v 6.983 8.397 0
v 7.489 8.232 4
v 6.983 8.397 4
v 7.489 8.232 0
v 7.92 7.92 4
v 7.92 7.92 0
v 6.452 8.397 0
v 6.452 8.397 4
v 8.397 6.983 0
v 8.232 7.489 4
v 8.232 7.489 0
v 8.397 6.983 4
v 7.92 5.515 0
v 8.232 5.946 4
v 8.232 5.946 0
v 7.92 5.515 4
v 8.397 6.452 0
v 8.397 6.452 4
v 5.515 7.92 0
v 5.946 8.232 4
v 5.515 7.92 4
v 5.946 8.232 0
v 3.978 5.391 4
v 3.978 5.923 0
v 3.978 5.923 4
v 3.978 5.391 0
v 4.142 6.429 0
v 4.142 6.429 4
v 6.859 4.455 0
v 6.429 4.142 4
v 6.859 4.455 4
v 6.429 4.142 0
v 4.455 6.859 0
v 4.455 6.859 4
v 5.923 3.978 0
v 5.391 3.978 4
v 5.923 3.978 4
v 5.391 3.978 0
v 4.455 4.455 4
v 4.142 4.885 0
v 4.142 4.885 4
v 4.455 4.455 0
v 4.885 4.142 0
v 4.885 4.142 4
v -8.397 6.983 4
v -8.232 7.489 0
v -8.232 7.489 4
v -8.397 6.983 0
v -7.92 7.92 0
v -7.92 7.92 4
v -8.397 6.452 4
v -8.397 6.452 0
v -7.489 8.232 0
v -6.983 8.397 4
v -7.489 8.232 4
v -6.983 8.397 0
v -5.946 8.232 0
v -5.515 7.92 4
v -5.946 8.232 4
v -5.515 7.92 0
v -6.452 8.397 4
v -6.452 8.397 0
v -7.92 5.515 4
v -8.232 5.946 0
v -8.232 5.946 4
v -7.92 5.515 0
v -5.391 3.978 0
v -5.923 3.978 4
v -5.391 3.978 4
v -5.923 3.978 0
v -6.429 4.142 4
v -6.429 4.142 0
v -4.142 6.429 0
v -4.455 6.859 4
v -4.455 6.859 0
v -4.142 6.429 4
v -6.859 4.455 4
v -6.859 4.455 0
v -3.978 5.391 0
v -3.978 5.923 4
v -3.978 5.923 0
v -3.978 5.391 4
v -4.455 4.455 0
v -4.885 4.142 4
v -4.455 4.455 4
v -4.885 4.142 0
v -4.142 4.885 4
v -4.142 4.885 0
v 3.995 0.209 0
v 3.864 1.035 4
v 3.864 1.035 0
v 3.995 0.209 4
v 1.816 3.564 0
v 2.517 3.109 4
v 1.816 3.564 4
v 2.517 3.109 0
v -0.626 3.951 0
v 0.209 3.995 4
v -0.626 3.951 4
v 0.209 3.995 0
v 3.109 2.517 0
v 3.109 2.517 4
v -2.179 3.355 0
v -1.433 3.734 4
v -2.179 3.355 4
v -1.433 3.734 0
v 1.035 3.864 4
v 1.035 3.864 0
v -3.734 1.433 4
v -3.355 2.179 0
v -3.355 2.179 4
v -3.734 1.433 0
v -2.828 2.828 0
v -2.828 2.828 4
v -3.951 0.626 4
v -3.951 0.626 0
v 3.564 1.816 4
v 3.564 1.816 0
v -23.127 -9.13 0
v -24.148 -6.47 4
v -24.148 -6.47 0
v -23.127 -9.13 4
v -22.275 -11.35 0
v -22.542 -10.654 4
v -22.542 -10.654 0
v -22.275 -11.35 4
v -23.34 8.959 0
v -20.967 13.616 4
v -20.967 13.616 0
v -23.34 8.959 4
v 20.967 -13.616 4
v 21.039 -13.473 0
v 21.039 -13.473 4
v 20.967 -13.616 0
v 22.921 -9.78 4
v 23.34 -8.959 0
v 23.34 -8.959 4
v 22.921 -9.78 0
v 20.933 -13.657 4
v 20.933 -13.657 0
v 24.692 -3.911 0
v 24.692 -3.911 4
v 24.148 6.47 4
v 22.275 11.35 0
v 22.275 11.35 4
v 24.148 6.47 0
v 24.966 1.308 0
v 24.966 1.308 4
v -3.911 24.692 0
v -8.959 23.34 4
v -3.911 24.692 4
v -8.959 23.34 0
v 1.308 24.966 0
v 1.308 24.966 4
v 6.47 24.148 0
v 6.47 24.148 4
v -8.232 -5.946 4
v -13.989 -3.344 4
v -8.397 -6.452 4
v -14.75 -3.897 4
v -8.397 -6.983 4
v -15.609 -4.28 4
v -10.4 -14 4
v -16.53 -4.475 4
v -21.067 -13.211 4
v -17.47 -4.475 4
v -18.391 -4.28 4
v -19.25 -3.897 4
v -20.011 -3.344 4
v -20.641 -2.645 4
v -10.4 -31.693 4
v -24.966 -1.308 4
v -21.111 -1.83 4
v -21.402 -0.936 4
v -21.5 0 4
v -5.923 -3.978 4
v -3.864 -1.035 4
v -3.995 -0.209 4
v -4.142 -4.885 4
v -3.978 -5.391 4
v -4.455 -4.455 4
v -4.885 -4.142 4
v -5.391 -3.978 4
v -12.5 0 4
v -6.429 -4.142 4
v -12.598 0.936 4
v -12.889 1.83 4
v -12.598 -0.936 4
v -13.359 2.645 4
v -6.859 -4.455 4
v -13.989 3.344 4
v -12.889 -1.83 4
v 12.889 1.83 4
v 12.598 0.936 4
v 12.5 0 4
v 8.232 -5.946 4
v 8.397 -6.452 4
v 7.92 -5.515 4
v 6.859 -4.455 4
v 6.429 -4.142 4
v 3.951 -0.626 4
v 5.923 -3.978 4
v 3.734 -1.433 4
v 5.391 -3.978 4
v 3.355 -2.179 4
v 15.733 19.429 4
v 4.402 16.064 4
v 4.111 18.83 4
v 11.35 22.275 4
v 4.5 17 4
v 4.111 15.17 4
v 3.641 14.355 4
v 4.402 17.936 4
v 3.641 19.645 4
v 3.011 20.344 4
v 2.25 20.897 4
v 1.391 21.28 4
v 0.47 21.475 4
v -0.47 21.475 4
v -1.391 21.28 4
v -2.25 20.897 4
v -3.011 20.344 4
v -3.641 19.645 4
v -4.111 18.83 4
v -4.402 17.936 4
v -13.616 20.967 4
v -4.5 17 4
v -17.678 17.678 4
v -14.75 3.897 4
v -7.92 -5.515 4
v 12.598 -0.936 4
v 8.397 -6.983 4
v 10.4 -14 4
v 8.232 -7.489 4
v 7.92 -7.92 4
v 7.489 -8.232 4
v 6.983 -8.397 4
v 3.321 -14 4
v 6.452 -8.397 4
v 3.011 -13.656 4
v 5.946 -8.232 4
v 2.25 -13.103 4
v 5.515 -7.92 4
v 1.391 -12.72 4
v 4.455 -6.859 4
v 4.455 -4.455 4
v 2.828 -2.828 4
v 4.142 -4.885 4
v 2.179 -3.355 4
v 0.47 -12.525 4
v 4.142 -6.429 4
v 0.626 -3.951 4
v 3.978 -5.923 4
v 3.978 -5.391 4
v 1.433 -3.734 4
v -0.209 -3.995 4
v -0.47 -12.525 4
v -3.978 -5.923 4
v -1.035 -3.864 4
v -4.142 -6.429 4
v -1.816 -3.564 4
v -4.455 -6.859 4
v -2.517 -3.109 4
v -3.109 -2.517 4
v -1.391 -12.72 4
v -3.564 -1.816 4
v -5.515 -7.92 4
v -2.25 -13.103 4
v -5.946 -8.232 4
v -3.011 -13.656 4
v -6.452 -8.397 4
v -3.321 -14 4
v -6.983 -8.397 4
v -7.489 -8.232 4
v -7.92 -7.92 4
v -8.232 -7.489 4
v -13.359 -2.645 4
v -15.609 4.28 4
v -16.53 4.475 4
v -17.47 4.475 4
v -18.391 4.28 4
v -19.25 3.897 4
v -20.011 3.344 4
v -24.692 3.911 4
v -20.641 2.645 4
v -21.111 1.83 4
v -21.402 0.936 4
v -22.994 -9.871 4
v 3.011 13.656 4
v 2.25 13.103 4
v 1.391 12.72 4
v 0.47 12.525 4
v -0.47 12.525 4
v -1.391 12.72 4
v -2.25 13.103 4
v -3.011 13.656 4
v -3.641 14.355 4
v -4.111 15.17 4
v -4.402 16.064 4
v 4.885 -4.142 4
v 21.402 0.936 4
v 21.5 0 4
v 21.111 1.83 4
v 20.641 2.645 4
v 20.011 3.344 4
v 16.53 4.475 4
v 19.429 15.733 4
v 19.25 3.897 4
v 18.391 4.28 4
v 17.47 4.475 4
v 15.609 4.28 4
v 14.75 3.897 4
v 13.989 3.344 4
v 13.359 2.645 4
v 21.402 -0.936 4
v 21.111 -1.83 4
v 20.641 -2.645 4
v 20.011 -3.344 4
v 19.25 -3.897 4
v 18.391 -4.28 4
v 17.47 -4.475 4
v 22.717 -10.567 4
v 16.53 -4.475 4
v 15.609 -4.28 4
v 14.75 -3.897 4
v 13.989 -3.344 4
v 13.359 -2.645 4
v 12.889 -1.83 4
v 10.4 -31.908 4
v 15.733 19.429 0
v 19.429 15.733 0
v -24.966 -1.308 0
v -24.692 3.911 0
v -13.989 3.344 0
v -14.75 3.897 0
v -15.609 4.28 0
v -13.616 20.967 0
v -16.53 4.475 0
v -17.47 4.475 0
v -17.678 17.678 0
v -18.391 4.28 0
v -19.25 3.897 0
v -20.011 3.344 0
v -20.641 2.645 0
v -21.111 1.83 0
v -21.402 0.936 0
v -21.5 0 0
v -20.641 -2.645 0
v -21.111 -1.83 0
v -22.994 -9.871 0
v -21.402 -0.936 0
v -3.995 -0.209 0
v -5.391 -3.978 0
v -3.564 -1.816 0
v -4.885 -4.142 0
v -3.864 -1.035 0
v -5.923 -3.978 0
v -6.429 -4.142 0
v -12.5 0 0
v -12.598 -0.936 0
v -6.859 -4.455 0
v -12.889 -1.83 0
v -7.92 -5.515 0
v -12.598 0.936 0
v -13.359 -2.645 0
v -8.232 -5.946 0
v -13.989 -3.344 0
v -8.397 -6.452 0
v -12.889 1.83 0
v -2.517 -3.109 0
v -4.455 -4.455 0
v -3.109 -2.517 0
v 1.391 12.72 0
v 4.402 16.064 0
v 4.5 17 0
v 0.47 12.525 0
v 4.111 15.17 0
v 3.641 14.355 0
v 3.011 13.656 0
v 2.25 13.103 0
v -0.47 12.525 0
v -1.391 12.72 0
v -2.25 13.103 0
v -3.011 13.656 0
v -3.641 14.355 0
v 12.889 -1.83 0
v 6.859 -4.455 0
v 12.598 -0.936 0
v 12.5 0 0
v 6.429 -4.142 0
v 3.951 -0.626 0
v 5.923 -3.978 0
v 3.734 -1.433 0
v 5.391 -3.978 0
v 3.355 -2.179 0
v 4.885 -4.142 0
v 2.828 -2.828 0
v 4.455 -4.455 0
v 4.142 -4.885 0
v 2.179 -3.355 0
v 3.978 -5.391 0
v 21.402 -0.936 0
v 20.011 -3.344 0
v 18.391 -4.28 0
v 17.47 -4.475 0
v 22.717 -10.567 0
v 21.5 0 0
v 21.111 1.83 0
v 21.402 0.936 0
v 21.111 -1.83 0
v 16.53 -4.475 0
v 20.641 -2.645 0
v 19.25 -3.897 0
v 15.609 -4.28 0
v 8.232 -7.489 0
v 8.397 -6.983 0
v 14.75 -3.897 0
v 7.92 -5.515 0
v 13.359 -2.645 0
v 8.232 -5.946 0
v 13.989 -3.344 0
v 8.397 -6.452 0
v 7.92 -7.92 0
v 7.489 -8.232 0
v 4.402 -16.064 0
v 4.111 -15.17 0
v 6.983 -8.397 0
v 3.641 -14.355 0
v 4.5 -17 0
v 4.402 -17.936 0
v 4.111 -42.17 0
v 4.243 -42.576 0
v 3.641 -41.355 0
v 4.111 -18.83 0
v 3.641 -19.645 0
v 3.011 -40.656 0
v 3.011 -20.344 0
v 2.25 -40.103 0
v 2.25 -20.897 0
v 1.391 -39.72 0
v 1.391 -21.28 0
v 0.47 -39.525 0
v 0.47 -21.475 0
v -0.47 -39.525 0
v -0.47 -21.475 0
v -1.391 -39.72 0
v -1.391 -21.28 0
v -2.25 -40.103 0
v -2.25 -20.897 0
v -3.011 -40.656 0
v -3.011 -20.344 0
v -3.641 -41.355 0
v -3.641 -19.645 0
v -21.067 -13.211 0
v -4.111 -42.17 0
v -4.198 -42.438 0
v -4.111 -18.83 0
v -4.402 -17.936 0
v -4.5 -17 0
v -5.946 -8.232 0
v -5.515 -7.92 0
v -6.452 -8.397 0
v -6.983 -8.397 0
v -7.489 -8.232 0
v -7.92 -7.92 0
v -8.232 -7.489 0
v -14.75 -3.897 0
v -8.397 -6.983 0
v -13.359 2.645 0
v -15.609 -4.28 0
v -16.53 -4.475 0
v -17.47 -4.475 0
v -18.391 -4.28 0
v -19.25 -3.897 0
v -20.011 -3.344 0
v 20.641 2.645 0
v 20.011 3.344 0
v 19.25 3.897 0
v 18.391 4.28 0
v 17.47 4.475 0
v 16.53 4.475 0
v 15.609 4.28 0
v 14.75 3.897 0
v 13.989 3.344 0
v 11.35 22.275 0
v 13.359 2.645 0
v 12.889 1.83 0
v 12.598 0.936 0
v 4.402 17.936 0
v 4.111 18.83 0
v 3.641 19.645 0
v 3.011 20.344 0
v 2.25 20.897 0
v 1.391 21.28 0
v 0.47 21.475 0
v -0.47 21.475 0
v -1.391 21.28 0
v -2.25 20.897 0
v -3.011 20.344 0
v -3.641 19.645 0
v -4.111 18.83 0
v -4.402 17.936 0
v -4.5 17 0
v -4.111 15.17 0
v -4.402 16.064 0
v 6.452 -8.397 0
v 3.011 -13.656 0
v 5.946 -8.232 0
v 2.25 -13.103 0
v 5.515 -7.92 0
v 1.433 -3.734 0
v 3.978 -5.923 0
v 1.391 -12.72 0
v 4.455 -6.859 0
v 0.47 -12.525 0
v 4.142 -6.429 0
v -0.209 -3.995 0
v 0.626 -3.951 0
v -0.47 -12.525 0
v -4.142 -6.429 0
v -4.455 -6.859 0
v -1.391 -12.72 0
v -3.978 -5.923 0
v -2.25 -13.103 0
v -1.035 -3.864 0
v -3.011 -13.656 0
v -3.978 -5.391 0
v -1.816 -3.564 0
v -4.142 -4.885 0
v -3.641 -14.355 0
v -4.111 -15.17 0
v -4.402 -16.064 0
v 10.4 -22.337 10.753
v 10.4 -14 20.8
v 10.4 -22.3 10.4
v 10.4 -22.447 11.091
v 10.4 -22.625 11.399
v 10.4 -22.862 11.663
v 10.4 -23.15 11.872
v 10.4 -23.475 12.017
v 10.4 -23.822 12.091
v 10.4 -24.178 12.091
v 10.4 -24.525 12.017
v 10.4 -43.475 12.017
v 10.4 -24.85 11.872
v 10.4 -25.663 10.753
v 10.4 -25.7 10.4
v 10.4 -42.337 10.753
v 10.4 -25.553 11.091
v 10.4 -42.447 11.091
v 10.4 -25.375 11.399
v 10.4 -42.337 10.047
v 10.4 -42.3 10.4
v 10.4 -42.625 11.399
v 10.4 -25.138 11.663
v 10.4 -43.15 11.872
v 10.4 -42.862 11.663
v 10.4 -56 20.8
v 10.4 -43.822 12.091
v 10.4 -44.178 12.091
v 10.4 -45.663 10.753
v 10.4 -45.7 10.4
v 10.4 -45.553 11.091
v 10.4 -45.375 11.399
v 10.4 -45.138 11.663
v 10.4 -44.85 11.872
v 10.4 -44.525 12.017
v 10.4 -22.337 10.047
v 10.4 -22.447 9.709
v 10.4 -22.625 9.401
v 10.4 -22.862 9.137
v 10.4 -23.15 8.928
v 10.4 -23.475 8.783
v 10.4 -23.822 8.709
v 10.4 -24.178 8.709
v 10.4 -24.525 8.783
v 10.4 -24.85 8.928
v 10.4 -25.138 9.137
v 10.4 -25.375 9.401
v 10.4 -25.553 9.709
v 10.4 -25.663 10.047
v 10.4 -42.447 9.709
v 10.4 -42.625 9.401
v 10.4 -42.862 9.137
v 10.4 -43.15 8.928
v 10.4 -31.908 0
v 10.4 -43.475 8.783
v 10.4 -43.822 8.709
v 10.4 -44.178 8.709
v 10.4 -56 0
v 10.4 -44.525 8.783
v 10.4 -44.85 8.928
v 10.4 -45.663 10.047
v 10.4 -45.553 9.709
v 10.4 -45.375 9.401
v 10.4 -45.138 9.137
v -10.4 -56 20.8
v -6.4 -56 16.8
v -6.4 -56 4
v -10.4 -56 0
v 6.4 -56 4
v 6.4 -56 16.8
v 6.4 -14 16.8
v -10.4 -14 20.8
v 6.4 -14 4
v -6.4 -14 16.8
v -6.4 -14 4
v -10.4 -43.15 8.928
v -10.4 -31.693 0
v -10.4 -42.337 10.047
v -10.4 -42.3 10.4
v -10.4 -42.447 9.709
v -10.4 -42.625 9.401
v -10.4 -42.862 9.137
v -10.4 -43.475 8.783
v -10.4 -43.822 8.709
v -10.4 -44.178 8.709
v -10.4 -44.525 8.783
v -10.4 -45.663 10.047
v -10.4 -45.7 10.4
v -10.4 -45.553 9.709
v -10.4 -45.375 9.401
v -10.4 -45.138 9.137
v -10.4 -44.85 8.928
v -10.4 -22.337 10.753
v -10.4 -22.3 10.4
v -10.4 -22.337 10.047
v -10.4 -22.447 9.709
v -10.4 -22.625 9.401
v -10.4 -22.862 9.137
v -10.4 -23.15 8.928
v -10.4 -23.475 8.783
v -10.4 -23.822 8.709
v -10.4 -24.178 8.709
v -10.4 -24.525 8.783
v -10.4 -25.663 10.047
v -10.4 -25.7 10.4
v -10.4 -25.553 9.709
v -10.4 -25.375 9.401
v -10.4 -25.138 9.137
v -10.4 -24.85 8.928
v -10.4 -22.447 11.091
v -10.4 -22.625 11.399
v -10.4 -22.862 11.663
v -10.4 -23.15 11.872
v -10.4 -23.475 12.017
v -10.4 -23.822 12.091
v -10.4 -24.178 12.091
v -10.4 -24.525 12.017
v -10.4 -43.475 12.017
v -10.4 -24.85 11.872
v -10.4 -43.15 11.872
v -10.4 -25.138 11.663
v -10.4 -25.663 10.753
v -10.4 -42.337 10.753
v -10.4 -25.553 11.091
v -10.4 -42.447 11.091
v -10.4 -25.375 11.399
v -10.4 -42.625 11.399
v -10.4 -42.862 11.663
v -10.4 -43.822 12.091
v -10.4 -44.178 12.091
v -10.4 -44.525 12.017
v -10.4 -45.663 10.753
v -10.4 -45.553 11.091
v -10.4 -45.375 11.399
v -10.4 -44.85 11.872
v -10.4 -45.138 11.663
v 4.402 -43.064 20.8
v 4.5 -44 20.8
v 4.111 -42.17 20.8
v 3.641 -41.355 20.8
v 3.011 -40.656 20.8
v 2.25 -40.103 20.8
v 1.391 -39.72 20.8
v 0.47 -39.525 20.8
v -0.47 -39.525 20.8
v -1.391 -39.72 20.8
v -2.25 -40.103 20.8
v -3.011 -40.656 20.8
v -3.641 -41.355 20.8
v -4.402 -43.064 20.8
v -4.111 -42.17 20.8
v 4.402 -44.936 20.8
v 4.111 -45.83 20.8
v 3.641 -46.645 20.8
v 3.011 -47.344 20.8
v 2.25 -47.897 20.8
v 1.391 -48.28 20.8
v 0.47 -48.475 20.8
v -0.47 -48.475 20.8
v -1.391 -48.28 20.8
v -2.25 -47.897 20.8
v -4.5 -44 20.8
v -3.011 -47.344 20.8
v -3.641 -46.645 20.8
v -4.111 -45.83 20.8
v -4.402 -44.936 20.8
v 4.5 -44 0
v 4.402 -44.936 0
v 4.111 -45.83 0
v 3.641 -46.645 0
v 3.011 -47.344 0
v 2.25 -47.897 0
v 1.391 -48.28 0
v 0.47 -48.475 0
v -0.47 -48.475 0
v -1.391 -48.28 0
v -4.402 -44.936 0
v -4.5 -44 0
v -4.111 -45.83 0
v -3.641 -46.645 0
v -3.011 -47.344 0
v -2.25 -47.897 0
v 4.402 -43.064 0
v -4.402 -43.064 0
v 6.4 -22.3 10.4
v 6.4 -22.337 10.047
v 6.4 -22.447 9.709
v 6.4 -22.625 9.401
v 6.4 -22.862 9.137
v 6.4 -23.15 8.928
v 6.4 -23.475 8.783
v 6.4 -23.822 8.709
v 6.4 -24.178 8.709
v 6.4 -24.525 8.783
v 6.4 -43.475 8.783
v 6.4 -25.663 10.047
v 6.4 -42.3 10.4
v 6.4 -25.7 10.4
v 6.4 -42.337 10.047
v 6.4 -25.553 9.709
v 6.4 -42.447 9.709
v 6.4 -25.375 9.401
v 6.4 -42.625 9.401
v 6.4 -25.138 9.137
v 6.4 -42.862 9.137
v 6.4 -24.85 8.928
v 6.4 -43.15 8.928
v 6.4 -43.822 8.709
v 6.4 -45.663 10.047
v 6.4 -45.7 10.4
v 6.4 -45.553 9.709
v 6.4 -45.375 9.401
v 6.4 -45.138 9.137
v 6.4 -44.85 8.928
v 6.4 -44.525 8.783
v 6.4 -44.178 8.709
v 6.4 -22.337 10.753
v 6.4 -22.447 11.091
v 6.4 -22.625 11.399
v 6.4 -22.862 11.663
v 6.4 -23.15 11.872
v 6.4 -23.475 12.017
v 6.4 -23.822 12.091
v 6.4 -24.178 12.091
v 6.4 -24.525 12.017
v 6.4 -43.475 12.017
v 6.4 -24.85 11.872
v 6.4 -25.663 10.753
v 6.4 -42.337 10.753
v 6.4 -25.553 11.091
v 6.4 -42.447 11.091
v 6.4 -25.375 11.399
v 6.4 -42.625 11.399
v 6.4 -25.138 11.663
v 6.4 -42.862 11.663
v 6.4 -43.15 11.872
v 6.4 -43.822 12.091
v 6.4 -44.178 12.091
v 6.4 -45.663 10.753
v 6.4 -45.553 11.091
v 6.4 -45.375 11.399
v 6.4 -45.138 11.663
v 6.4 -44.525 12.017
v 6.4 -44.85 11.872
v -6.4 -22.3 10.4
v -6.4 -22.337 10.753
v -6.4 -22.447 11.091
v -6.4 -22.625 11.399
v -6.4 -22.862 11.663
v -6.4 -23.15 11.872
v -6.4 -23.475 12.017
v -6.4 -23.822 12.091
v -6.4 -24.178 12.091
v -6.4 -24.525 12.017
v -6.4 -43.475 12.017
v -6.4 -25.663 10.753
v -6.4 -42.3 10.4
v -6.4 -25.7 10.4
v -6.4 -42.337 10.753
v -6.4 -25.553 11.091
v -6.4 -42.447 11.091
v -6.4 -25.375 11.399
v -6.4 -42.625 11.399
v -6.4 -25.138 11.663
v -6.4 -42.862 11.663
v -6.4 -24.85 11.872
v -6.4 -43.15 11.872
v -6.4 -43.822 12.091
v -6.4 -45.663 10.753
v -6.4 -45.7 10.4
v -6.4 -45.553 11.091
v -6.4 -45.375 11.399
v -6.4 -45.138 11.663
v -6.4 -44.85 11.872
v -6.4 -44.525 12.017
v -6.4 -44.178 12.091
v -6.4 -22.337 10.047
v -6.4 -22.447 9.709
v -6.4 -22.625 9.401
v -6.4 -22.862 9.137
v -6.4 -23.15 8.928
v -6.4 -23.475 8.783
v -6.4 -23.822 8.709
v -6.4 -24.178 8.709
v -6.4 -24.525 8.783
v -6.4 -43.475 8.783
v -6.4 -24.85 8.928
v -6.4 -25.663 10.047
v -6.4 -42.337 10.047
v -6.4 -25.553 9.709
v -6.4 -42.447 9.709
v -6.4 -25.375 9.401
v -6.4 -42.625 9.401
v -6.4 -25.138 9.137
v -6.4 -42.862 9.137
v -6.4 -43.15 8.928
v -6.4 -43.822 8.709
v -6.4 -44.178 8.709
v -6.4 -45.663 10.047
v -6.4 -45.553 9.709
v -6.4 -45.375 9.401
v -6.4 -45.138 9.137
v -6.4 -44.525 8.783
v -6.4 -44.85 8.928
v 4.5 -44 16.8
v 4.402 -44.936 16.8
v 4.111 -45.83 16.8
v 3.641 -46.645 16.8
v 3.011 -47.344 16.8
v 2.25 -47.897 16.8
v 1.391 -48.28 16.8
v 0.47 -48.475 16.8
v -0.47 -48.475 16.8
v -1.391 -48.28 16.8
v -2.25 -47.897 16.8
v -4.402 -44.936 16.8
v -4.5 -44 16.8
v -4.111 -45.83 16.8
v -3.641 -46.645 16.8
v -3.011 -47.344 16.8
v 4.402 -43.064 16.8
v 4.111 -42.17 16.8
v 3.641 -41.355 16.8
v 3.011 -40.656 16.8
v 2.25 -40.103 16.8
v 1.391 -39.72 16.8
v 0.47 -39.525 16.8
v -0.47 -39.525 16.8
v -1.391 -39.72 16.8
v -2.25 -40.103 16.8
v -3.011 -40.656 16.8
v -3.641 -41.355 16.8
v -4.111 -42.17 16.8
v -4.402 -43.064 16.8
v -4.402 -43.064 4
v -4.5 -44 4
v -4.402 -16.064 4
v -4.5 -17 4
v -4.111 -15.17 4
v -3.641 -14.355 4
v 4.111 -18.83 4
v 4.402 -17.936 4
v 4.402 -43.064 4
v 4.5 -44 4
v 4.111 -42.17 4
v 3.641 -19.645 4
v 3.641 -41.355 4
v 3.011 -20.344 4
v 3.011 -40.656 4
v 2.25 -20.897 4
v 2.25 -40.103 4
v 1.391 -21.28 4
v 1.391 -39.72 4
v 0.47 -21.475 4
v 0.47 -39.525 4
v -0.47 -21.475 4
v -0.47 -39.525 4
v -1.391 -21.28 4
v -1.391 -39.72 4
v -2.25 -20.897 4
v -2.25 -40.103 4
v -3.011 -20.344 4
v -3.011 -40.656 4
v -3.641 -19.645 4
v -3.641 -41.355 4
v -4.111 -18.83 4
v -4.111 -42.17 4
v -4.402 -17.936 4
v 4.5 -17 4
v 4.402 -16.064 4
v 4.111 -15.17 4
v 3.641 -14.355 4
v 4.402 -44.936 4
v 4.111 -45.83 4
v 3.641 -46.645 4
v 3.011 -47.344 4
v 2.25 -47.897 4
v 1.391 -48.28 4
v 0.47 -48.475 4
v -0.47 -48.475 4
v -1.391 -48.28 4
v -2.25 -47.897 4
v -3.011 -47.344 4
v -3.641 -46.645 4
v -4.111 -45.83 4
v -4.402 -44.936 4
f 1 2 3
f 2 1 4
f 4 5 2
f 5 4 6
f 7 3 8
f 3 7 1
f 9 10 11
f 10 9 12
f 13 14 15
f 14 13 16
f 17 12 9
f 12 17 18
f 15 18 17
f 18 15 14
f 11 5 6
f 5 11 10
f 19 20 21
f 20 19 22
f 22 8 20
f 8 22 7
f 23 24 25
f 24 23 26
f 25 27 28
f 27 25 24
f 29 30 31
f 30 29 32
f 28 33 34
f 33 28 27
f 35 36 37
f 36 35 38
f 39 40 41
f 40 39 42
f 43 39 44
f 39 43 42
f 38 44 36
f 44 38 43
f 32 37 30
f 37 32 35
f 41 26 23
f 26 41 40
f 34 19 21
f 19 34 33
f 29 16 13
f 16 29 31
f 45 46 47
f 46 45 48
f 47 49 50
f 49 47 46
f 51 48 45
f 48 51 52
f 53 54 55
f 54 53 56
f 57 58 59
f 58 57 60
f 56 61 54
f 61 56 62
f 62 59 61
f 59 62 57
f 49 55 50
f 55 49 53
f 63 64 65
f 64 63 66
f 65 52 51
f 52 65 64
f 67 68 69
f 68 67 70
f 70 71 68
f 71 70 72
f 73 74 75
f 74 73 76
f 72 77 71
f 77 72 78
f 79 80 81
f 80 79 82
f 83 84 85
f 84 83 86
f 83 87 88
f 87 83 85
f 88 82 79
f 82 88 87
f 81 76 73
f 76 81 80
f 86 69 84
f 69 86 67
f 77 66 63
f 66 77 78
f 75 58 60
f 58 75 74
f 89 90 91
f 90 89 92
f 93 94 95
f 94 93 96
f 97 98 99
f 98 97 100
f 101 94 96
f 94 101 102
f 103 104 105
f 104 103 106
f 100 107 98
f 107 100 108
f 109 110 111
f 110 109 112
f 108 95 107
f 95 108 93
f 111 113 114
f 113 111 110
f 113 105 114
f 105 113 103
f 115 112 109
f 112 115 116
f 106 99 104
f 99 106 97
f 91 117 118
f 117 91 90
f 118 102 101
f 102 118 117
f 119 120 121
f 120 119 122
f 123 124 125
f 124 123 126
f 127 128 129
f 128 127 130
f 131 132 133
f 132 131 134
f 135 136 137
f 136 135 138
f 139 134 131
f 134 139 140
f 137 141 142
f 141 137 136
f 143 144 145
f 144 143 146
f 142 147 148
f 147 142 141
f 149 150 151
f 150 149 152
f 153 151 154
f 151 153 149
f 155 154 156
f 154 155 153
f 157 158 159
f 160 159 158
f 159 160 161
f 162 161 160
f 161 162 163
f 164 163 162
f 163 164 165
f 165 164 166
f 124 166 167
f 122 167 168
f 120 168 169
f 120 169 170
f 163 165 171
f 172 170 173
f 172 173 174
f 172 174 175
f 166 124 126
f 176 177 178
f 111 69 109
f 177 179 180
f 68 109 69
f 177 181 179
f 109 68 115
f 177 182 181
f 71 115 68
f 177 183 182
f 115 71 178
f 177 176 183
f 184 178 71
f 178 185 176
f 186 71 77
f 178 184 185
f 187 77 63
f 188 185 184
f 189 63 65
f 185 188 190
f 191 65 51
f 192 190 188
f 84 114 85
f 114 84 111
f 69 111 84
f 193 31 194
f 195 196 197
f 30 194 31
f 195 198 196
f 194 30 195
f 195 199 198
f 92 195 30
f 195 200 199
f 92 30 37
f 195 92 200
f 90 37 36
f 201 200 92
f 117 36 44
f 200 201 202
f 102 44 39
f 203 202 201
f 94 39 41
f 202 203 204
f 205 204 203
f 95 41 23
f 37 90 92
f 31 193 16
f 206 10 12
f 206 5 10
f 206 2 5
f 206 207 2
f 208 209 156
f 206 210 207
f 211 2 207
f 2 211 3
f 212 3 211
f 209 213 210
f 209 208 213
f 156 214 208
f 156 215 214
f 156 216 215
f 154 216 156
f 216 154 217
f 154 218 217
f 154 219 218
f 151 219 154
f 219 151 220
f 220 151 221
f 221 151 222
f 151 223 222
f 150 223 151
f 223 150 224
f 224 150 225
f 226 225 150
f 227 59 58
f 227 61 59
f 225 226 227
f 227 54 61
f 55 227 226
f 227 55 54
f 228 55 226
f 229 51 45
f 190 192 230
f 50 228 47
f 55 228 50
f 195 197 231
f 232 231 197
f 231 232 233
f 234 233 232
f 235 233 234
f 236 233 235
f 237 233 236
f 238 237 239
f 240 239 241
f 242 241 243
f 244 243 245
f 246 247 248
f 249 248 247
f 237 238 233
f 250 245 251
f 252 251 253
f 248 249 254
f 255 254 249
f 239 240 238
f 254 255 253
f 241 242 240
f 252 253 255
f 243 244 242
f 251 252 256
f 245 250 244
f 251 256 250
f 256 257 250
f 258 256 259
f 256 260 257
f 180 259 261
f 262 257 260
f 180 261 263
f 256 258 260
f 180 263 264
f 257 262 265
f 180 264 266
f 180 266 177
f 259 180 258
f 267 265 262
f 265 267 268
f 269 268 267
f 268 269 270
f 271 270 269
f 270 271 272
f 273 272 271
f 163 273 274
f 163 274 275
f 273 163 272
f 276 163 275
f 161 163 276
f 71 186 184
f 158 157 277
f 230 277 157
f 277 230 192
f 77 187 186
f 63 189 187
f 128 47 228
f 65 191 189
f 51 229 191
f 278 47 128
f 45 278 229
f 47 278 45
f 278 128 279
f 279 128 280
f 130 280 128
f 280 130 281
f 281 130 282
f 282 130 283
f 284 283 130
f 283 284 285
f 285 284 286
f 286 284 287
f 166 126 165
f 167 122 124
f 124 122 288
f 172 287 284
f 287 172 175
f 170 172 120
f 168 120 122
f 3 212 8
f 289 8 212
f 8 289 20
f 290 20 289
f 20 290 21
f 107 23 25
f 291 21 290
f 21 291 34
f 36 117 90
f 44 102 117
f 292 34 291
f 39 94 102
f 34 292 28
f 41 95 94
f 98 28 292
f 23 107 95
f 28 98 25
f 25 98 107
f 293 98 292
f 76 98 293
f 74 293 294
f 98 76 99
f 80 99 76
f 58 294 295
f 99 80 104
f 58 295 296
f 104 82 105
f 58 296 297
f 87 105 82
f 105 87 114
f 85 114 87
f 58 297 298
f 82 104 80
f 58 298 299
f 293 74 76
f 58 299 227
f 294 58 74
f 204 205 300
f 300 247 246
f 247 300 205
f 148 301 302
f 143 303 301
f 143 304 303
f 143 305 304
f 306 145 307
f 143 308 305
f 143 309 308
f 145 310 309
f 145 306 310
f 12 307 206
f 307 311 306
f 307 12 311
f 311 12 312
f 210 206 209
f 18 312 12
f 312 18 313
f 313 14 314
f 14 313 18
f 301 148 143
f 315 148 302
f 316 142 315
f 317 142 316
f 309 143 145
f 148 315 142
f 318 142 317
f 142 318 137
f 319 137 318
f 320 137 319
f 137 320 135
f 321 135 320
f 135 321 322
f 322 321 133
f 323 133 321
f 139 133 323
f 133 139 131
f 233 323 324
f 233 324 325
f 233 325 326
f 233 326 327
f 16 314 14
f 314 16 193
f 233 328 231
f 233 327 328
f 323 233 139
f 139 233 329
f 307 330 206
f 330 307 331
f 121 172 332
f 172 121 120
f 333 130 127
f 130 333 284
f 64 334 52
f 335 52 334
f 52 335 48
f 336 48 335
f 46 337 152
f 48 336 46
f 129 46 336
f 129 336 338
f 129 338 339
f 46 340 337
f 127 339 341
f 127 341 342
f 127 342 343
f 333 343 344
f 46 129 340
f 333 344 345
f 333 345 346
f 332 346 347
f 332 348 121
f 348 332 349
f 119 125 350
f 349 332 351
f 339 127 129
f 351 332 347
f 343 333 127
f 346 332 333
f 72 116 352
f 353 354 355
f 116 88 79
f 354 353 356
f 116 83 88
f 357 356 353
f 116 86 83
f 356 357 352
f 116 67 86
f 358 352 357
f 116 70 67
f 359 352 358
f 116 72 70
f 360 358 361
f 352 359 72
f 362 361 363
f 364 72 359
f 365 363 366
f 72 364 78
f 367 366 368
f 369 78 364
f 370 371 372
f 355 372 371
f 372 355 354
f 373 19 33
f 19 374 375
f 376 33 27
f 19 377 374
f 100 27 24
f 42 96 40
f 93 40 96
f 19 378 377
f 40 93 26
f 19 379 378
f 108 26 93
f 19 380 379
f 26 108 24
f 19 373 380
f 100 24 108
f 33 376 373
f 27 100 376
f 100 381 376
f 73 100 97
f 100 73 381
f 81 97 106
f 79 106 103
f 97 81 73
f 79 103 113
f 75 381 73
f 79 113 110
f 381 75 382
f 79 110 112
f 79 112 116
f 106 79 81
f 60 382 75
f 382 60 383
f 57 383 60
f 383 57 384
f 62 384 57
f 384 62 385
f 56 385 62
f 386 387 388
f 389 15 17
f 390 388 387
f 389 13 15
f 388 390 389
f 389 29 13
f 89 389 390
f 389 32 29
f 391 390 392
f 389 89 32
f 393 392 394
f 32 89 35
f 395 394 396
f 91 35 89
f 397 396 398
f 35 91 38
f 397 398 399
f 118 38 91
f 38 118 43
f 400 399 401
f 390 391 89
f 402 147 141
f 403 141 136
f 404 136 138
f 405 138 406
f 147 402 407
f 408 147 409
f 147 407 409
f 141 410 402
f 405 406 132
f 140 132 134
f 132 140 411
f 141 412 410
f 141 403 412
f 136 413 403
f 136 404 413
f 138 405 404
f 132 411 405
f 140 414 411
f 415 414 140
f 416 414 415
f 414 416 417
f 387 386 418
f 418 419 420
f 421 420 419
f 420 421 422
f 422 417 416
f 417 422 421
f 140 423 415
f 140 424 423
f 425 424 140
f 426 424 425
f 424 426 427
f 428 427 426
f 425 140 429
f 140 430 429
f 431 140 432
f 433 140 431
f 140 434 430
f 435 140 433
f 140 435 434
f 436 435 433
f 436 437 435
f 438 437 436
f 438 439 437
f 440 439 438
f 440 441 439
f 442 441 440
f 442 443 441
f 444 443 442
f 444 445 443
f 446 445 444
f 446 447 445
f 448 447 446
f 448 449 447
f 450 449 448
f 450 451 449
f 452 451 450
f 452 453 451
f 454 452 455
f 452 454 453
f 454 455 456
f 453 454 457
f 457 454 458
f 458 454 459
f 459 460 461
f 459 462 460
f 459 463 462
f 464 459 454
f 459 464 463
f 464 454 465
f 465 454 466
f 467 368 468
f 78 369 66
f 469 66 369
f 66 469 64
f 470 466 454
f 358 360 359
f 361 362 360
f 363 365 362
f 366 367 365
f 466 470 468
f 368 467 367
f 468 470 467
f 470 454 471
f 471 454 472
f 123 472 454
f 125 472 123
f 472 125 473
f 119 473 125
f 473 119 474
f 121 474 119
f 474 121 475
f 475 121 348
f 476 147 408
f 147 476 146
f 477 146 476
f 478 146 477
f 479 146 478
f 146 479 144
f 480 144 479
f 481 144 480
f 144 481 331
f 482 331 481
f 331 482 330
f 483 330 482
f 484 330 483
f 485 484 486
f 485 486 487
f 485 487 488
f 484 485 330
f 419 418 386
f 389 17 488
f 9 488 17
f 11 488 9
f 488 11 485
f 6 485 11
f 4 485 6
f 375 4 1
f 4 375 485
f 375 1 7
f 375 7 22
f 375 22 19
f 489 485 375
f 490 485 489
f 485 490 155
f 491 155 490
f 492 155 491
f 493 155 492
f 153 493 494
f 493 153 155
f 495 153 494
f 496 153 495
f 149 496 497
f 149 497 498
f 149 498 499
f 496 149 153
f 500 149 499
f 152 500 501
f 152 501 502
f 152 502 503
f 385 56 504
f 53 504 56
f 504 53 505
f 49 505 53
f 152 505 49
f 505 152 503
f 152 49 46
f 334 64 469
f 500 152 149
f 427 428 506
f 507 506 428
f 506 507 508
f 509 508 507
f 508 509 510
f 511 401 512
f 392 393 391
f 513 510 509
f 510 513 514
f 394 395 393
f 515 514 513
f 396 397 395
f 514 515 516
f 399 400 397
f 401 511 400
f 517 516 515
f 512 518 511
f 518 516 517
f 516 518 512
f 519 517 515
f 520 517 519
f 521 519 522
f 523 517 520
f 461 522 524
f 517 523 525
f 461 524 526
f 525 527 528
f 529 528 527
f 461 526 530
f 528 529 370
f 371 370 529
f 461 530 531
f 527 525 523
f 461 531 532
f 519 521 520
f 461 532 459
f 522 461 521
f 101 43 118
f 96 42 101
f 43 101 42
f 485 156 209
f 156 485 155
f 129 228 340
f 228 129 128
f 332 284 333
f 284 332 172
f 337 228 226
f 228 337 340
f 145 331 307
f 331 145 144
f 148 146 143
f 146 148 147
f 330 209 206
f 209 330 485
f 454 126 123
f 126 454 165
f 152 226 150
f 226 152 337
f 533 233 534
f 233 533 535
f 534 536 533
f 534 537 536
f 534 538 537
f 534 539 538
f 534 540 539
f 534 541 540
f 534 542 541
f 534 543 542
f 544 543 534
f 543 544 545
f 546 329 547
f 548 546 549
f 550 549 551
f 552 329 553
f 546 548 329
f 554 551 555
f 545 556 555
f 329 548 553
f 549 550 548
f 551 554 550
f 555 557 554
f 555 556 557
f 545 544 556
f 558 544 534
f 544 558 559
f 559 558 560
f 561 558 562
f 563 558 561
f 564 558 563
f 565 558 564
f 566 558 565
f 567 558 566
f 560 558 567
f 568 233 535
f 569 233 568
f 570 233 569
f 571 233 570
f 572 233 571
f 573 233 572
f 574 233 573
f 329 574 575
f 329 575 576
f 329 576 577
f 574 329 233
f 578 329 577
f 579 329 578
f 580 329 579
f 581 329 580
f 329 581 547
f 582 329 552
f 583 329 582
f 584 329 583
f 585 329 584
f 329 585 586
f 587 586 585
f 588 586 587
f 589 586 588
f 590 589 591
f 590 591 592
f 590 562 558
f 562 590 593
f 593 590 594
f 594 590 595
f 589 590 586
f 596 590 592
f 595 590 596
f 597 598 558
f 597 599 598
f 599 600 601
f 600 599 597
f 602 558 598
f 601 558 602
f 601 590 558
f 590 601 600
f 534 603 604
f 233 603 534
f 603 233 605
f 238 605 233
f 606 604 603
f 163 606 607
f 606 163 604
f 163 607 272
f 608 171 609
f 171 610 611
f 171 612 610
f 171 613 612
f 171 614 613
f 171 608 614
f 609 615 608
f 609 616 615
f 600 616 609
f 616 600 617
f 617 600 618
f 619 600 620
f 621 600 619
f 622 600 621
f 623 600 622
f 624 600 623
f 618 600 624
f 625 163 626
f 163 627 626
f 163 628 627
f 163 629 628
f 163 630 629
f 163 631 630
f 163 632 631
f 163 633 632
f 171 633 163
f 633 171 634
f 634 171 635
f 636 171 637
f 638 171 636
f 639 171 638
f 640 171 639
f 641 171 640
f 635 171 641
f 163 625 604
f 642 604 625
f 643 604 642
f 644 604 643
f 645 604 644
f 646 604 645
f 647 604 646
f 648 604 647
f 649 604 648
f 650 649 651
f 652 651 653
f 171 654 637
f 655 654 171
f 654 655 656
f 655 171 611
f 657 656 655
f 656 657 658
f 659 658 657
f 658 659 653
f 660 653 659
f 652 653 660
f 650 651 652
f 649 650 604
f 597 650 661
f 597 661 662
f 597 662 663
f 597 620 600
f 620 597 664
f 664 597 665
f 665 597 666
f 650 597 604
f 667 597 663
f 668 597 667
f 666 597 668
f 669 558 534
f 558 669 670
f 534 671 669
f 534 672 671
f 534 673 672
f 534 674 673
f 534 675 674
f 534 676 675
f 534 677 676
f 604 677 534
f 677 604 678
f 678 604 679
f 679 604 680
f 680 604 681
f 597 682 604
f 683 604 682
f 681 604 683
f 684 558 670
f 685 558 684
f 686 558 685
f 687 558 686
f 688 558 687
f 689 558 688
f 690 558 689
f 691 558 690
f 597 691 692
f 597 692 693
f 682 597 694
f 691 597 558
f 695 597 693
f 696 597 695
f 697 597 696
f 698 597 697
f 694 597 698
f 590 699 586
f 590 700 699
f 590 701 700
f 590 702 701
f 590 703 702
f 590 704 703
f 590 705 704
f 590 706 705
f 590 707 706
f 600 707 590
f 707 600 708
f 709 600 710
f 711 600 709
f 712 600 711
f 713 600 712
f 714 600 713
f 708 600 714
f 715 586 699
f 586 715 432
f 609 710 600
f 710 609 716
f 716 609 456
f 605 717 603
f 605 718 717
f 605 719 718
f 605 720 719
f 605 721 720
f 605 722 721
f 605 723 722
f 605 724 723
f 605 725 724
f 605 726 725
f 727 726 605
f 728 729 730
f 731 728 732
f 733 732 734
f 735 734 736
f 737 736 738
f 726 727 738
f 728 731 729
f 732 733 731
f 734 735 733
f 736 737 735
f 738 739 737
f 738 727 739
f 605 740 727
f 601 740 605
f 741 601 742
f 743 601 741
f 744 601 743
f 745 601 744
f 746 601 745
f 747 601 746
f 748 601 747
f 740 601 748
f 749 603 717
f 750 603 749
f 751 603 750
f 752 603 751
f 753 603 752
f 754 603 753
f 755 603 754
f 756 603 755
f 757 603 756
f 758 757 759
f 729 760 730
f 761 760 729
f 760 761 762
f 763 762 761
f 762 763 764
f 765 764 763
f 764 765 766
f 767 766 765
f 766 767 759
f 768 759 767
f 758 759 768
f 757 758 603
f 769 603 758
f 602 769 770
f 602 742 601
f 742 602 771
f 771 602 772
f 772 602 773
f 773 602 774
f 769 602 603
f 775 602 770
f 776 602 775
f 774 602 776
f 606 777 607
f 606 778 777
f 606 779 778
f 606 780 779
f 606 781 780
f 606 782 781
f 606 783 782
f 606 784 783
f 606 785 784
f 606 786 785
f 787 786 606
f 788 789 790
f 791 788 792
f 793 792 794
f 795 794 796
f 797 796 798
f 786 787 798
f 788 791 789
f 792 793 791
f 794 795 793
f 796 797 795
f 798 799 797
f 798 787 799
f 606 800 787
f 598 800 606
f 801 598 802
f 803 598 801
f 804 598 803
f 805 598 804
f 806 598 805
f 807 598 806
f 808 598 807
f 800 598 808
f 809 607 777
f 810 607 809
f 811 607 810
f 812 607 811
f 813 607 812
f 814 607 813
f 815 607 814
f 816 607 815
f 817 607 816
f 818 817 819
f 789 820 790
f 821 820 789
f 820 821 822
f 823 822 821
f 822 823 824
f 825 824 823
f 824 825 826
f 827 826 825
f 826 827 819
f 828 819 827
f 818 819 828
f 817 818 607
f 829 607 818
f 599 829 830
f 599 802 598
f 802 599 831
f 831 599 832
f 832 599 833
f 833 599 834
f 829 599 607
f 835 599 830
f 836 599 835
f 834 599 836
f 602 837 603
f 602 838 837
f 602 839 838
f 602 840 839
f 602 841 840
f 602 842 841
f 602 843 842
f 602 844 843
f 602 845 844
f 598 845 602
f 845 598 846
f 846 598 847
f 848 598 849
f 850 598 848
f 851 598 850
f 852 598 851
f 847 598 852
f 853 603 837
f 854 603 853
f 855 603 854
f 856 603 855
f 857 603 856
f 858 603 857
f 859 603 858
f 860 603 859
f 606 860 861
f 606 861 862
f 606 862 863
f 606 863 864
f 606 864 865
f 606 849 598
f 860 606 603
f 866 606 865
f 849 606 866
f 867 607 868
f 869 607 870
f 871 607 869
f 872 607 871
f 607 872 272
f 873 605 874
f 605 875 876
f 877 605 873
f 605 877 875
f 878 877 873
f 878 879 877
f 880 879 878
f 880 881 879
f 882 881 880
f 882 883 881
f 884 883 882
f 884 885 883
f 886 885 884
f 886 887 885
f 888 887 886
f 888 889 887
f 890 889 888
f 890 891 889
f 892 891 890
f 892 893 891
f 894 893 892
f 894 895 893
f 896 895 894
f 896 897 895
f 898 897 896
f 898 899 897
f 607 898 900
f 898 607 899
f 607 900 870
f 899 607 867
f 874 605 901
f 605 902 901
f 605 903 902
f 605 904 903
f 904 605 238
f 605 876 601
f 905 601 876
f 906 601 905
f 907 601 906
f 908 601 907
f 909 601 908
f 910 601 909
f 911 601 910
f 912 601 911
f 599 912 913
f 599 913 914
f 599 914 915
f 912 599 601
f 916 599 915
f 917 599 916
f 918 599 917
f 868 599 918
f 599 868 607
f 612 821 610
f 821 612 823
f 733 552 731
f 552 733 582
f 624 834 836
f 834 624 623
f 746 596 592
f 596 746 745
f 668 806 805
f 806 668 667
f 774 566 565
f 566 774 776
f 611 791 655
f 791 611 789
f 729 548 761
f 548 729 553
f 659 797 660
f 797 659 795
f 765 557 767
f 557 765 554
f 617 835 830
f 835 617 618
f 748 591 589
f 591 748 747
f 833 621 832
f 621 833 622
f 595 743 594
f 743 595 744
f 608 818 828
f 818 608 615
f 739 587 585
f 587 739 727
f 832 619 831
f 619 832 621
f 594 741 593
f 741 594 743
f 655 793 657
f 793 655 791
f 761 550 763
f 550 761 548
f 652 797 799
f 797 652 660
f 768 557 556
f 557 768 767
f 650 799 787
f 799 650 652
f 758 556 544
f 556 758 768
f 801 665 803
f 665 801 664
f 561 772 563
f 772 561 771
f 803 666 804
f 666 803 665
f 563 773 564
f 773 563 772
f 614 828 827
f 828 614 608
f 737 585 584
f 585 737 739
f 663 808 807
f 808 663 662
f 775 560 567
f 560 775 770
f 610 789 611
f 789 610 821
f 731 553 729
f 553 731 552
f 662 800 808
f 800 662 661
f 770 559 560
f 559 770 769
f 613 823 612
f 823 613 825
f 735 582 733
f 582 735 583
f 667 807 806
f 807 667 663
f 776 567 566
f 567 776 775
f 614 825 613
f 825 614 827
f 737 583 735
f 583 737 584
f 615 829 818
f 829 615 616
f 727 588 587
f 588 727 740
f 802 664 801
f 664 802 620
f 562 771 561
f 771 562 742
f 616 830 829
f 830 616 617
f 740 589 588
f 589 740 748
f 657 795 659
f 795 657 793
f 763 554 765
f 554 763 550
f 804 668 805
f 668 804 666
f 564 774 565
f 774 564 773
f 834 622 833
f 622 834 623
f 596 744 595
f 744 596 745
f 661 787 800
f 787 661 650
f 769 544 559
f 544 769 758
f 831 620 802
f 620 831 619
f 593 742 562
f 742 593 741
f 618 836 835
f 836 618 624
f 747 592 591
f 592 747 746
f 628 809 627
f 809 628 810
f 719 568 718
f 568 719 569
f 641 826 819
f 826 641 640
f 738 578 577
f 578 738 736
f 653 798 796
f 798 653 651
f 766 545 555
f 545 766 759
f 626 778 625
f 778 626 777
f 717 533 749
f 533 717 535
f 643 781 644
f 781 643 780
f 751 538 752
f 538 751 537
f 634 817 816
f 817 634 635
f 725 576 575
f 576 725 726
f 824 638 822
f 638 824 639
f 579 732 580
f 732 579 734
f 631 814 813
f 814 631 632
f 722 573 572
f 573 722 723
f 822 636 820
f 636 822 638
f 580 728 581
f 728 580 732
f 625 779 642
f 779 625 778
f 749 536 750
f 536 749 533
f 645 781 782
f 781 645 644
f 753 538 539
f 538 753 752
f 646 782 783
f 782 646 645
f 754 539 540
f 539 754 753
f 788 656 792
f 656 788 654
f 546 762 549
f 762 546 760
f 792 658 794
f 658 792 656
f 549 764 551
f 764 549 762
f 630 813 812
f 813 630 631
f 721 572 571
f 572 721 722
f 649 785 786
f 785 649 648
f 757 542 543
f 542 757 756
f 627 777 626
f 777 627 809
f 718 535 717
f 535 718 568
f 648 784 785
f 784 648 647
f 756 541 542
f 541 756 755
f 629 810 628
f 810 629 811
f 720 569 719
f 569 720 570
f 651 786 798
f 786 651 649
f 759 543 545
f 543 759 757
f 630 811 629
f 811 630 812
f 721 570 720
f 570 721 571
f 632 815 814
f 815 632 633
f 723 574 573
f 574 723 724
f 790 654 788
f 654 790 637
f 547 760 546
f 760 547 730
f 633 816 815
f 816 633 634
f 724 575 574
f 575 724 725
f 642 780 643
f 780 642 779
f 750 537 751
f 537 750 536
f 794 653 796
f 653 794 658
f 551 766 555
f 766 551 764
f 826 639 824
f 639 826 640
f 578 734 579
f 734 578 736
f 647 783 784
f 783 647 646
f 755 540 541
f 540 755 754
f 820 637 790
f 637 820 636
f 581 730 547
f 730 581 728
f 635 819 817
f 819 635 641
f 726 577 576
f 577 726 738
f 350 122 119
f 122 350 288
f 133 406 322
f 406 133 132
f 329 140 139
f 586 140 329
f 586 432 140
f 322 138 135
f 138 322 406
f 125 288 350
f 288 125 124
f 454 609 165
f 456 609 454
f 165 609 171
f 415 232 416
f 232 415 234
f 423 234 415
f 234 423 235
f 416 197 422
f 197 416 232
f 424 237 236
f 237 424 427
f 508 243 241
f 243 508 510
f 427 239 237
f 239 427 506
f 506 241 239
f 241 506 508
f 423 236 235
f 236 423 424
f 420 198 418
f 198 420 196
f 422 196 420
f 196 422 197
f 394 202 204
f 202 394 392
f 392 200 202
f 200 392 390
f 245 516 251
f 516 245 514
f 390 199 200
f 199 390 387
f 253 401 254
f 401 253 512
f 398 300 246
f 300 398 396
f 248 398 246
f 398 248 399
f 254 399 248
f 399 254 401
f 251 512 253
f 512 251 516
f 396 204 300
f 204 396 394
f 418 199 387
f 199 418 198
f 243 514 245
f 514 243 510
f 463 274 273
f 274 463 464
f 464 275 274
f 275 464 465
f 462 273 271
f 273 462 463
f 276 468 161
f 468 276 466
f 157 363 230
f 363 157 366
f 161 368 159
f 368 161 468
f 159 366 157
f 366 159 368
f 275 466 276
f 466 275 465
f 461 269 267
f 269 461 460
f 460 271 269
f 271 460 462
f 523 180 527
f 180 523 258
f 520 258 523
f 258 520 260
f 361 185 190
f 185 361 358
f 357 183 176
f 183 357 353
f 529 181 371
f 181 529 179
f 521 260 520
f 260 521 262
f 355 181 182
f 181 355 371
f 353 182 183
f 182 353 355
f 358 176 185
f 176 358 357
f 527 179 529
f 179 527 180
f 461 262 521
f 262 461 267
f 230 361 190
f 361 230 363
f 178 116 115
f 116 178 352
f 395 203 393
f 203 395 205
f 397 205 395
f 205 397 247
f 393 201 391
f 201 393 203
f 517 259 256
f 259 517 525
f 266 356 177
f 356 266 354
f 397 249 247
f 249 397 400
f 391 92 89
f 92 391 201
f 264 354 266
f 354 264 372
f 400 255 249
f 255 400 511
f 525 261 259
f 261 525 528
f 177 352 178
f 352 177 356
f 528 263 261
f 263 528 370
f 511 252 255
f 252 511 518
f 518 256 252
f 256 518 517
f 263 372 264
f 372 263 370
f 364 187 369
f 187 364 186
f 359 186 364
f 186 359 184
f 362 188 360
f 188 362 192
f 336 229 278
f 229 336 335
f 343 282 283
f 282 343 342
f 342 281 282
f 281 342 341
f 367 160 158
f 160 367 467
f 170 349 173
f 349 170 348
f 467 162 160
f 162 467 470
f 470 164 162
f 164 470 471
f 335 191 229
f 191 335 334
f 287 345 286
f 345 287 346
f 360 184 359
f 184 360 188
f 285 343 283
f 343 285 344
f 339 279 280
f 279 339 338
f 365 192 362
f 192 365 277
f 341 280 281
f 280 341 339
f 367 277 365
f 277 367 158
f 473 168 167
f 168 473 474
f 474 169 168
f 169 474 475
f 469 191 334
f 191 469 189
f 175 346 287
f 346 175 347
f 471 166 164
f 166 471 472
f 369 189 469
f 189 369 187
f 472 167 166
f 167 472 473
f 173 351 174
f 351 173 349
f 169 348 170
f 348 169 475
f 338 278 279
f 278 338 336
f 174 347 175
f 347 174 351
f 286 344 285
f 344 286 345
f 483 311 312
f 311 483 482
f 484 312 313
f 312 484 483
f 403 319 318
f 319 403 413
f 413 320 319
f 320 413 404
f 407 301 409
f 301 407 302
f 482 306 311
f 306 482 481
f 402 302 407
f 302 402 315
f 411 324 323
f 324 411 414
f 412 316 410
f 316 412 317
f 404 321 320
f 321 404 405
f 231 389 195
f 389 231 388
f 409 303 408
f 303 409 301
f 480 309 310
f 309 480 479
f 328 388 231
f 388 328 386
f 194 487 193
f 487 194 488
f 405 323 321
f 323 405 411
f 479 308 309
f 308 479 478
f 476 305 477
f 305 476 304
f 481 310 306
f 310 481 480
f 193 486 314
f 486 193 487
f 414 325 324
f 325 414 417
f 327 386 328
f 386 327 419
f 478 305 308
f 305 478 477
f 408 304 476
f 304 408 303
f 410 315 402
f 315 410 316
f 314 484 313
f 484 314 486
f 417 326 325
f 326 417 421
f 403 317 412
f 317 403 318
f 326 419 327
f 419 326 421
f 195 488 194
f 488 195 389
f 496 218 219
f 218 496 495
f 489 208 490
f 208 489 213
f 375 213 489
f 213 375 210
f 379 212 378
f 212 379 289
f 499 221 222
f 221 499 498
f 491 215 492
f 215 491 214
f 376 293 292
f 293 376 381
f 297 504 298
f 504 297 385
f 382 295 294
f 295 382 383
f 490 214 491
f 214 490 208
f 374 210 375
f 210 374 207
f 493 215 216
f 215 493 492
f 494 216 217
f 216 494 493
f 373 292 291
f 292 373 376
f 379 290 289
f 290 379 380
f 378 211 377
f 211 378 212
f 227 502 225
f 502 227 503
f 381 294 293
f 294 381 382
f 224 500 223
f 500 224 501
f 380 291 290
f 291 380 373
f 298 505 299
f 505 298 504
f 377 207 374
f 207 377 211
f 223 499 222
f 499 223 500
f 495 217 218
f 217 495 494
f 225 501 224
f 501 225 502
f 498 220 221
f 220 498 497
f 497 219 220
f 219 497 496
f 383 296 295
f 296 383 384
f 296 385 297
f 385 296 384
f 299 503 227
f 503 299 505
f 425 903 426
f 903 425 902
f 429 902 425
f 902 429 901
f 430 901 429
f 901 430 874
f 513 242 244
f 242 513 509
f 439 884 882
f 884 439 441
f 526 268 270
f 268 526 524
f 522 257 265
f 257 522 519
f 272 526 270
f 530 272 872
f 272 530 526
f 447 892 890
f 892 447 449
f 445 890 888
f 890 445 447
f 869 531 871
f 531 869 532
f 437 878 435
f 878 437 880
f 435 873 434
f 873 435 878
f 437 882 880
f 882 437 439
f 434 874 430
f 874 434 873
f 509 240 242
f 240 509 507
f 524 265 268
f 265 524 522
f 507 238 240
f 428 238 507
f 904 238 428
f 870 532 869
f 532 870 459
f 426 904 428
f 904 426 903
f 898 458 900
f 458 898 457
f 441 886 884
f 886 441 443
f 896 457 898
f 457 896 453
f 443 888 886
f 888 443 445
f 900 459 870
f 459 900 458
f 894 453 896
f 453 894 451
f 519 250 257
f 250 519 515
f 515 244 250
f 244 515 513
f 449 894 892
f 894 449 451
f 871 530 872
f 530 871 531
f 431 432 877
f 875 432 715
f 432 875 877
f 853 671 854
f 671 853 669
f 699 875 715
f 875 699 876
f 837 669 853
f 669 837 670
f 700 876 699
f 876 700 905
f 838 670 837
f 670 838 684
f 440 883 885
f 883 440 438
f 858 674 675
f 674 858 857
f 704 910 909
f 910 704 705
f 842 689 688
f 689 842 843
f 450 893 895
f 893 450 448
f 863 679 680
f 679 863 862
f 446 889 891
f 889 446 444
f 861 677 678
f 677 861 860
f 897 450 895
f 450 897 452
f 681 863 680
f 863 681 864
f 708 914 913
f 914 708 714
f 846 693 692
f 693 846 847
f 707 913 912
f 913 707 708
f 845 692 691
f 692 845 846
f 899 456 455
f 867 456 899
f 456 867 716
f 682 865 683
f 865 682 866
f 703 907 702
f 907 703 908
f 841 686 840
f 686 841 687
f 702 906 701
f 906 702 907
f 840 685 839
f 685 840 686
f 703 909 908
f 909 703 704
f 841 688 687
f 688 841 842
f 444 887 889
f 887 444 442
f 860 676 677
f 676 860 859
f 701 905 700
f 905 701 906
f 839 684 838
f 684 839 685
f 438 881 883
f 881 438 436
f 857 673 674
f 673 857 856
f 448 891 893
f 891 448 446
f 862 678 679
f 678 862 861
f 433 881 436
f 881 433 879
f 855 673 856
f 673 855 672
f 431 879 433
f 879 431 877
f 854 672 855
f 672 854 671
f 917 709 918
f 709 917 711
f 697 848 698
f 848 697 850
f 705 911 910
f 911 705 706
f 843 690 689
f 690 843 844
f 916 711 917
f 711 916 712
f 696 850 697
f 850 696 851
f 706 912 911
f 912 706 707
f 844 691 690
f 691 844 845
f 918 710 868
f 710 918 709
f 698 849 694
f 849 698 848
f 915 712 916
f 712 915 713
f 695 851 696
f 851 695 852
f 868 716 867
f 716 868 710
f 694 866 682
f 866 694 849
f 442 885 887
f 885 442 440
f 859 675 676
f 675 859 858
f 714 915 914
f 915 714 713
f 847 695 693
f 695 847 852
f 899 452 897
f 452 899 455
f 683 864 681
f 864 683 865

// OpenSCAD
// file: dronePlates.scad
/**
 * dronePlates.scad
 * Plate library
 *
 * GNU GPL V3
 * @author: Victor Potenciano
 */

m3Rad = 3.4/2;
cornerR = 4;

/**
 *
 */
module helperDisk(diameter) {
	cylinder(r = diameter/2, h = 0.6, $fn=20);
}

/**
 *
 */
module roundedRect(size, radius) {
	x = size[0];
	y = size[1];
	z = size[2];

	linear_extrude(height=z)
	hull() {
	// place 4 circles in the corners, with the given radius
	translate([(-x/2)+(radius/2), (-y/2)+(radius/2), 0]){ circle(r=radius); }
	translate([(x/2)-(radius/2), (-y/2)+(radius/2), 0]){ circle(r=radius); }
	translate([(-x/2)+(radius/2), (y/2)-(radius/2), 0]){ circle(r=radius); }
	translate([(x/2)-(radius/2), (y/2)-(radius/2), 0]){ circle(r=radius); }
	}
}

/**
 * rounded rectangle triangle with corner at origin
 */
module roundedTriangle(size, radius) {
	x = size[0];
	y = size[1];
	z = size[2];

	linear_extrude(height=z)
	hull() {
	translate([radius, radius, 0]){ circle(r=radius); }
	translate([x-radius, radius, 0]){ circle(r=radius); }
	translate([radius, y-radius, 0]){ circle(r=radius); }
	}
}

/**
 *
 */
module roundRectPlate(w, l, plateThick=3) {
	difference(){
		roundedRect([l+m3Rad*1.75,w+m3Rad*1.75,plateThick], cornerR);
		translate([l/2, w/2, -0.5]) { cylinder(h = plateThick+1, r = m3Rad, $fn=30); }
		translate([-l/2, w/2, -0.5]) { cylinder(h = plateThick+1, r = m3Rad, $fn=30); }
		translate([l/2, -w/2, -0.5]) { cylinder(h = plateThick+1, r = m3Rad, $fn=30); }
		translate([-l/2, -w/2, -0.5]) { cylinder(h = plateThick+1, r = m3Rad, $fn=30); }
	}
}

/**
 *
 */
module crossSquarePlate(l, thick=3) {
	inDist = cornerR*2+4;
	trianL = sqrt((l*l)/2)-inDist;
	centerR = 4;

	difference(){
		roundRectPlate(l, l, thick);
		translate([0, centerR, -0.5]) { 
			rotate([0,0,45]){ roundedTriangle([trianL,trianL,thick+1], cornerR-2); }
		}
		translate([0, -centerR, -0.5]) { 
			rotate([0,0,225]){ roundedTriangle([trianL,trianL,thick+1], cornerR-2); }
		}
		translate([-centerR, 0, -0.5]) { 
			rotate([0,0,135]){ roundedTriangle([trianL,trianL,thick+1], cornerR-2); }
		}
		translate([centerR, 0, -0.5]) { 
			rotate([0,0,-45]){ roundedTriangle([trianL,trianL,thick+1], cornerR-2); }
		}
	}
}

/**
 *
 */
module hShapePlate(w, l, thick=4) {
	inDist = cornerR*2+1;

	difference(){
		roundRectPlate(w, l, thick);
		translate([0, w/4, -0.5]) { roundedRect([l-inDist,w/2-inDist,thick+1], cornerR-2); }
		translate([0, -w/4, -0.5]) { roundedRect([l-inDist,w/2-inDist,thick+1], cornerR-2); }
	}
}

/**
 *
 */
module motorCircleMount(inDia, outDia, thick=3, extraH=false, d1=19, d2=16, holeR=m3Rad ) {
	difference(){
		cylinder(h = thick, r = outDia/2, $fn=30);
		motorCircleMountHoles(inDia, outDia, thick, extraH, d1=d1, d2=d2, holeR=holeR);
	}
}

/**
 *
 */
module motorCircleMountHoles(inDia, outDia, thick=3, extraH=false, d1=19, d2=16, d3=25, holeR=m3Rad) {
	translate([0, 0, -0.5]) { cylinder(h = thick+1, r = inDia/2, $fn=30); }

	for(i=[0:3]) {
		rotate([0,0,90*i]){
		translate([d1/2, 0, -0.5]) cylinder(h = thick+1, r = holeR, $fn=20);
		translate([d2/2, 0, -0.5]) cylinder(h = thick+1, r = holeR, $fn=20);
		translate([d2/2, -holeR, -0.5]) cube(size = [(d1-d2)/2,holeR*2,thick+1]);
		}
	}
	
	if(extraH==true){	
		for(i=[-1,1]) translate([i*d3/2, 0, -0.5]) { cylinder(h = thick+1, r = holeR, $fn=30); }
	}
}

/**
 *
 */
module motorRectMount(w, l, inDia, thick=3) {
	d1=19;
	d2=16;

	difference(){
		roundRectPlate(w, l, thick);
		translate([0, 0, -0.5]) { cylinder(h = thick+1, r = inDia/2, $fn=30); }
		translate([0, d1/2, -0.5]) { cylinder(h = thick+1, r = m3Rad, $fn=30); }
		translate([0, -d1/2, -0.5]) { cylinder(h = thick+1, r = m3Rad, $fn=30); }
		translate([d2/2, 0, -0.5]) { cylinder(h = thick+1, r = m3Rad, $fn=30); }
		translate([-d2/2, 0, -0.5]) { cylinder(h = thick+1, r = m3Rad, $fn=30); }
	}
}

/**
 *
 */
module tube(inDia, outDia, height) {
	difference(){
		cylinder(h = height, r = outDia/2, $fn=50);
		translate([0, 0, -0.5]) { cylinder(h = height+1, r = inDia/2, $fn=30); }
	}
}

/**
 *
 */
module squareTube(inDia, outDia, height) {
	translate([0,0,height/2]){
	difference(){
		cube(size = [outDia,outDia,height], center = true);
		cube(size = [inDia,inDia,height+1], center = true);
	}
	}
}

/**
 *
 */
module djiFlamewheelHoles(height) {
	a = 23;
	b = 16;
	c = 19.5;
	
	translate([a/2, c/2, 0]) { cylinder(h = height, r = m3Rad, $fn=30); }
	translate([-a/2, c/2, 0]) { cylinder(h = height, r = m3Rad, $fn=30); }
	translate([b/2, -c/2, 0]) { cylinder(h = height, r = m3Rad, $fn=30); }
	translate([-b/2, -c/2, 0]) { cylinder(h = height, r = m3Rad, $fn=30); }
}

/**
 *
 */
module djiFlamewheelHolesBotton(height) {
	a1 = 21;
	c = 19.5;
	
	translate([a1/2, c/2, 0]) { cylinder(h = height, r = m3Rad, $fn=30); }
	translate([-a1/2, c/2, 0]) { cylinder(h = height, r = m3Rad, $fn=30); }
}

/**
 *
 */
module propeller(size){
union(){
difference(){
	cylinder(h = 3, r = size/2, center=true, $fn=30);
	cylinder(h = 3.1, r = size/2-2, center=true, $fn=30); 
}
for( i = [-1,1] ){
rotate([0,0,45*i]){ cube(size = [size,4,1], center = true); }
}
}
}

/**
 *
 */
module slot(length, height, rad){
for(i=[-1,1]) translate([i*length/2,0,0]) cylinder(h = height, r = rad, $fn=30);
translate([0,0,height/2]) cube(size = [length,rad*2,height], center = true);
}

 

////////////////////////
// Examples:
////////////////////////

motorCircleMount(8, 25, 3.5);

//roundedRect([50,50,3], 4);

//hShapePlate(79, 25);

//rotate([0,0,45]){roundedTriangle([40,40,3], 4);}

//crossSquarePlate(45, 4);

/*
union(){
motorRectMount(21, 18, 8, 4);
translate([9, 10.5, 0]) {tube(m3Rad*2, 6.5, 6);}
}
*/

/*
difference(){
union(){
hShapePlate(50, 30, 3.5);
translate([-4,-25,0]){cube(size = [8,50,3.5]);}
rotate([0, 0, 45]) {motorCircleMount(8, 35, 3.5);}
}
cylinder(h = 10, r = 4, $fn=100, center=true);
}
*/

//rotate([90,0,0]){ tube(5,10,20); }
//translate([20,0,0]){ squareTube(5, 10, 20); }
// main file
/**
 * TBS disco XL motor mount
 *
 */

use <dronePlates.scad>


m3Rad = 3.4/2;
plateThick = 4;
armWidth = 12.8;
armSupp = 42;
armTubeT = 4;
armTubeW = armWidth+armTubeT*2;
fixHoleD = 30;
mountDia = 50;
trside = sqrt(0.5*mountDia*mountDia);
holesDist = 17;
holesR = 4.5;

difference(){

union(){

//motor mount
rotate([0,0,-45]){ motorCircleMount(8, mountDia, plateThick ); }

//reinforcement
translate([0,-mountDia,0]){
scale([1.01, 1.75, 1]){ rotate([0,0,45]){ roundedTriangle([trside,trside,plateThick], 4); } }
}

//square tube 
translate([0,-14,(armTubeW/2)+plateThick-armTubeT]){ 
	rotate([90,0,0]){ 
		difference(){
		squareTube(armWidth, armTubeW, armSupp);
		translate([0,0,fixHoleD]){ rotate([0,90,0]){cylinder(h = armTubeW+1, r = m3Rad, $fn=30, center=true);} }
		translate([0,0,fixHoleD-20]){ rotate([0,90,0]){cylinder(h = armTubeW+1, r = m3Rad, $fn=30, center=true);} }
		}
	} 
}

}//end union

rotate([0,0,-45]){ motorCircleMountHoles(8, mountDia, plateThick); }

//mount plate holes
translate([-holesDist,0,plateThick/2]){ cylinder(h = plateThick+1, r = holesR, $fn=30, center=true); }
translate([holesDist,0,plateThick/2]){ cylinder(h = plateThick+1, r = holesR, $fn=30, center=true); }
translate([0,holesDist,plateThick/2]){ cylinder(h = plateThick+1, r = holesR, $fn=30, center=true); }
translate([0,-holesDist,plateThick/2]){ cylinder(h = plateThick+1, r = holesR, $fn=30, center=true); }
translate([0,-(3*holesDist-7),plateThick/2]){ cylinder(h = armWidth*4, r = holesR, $fn=30, center=true); }

}//end diff
